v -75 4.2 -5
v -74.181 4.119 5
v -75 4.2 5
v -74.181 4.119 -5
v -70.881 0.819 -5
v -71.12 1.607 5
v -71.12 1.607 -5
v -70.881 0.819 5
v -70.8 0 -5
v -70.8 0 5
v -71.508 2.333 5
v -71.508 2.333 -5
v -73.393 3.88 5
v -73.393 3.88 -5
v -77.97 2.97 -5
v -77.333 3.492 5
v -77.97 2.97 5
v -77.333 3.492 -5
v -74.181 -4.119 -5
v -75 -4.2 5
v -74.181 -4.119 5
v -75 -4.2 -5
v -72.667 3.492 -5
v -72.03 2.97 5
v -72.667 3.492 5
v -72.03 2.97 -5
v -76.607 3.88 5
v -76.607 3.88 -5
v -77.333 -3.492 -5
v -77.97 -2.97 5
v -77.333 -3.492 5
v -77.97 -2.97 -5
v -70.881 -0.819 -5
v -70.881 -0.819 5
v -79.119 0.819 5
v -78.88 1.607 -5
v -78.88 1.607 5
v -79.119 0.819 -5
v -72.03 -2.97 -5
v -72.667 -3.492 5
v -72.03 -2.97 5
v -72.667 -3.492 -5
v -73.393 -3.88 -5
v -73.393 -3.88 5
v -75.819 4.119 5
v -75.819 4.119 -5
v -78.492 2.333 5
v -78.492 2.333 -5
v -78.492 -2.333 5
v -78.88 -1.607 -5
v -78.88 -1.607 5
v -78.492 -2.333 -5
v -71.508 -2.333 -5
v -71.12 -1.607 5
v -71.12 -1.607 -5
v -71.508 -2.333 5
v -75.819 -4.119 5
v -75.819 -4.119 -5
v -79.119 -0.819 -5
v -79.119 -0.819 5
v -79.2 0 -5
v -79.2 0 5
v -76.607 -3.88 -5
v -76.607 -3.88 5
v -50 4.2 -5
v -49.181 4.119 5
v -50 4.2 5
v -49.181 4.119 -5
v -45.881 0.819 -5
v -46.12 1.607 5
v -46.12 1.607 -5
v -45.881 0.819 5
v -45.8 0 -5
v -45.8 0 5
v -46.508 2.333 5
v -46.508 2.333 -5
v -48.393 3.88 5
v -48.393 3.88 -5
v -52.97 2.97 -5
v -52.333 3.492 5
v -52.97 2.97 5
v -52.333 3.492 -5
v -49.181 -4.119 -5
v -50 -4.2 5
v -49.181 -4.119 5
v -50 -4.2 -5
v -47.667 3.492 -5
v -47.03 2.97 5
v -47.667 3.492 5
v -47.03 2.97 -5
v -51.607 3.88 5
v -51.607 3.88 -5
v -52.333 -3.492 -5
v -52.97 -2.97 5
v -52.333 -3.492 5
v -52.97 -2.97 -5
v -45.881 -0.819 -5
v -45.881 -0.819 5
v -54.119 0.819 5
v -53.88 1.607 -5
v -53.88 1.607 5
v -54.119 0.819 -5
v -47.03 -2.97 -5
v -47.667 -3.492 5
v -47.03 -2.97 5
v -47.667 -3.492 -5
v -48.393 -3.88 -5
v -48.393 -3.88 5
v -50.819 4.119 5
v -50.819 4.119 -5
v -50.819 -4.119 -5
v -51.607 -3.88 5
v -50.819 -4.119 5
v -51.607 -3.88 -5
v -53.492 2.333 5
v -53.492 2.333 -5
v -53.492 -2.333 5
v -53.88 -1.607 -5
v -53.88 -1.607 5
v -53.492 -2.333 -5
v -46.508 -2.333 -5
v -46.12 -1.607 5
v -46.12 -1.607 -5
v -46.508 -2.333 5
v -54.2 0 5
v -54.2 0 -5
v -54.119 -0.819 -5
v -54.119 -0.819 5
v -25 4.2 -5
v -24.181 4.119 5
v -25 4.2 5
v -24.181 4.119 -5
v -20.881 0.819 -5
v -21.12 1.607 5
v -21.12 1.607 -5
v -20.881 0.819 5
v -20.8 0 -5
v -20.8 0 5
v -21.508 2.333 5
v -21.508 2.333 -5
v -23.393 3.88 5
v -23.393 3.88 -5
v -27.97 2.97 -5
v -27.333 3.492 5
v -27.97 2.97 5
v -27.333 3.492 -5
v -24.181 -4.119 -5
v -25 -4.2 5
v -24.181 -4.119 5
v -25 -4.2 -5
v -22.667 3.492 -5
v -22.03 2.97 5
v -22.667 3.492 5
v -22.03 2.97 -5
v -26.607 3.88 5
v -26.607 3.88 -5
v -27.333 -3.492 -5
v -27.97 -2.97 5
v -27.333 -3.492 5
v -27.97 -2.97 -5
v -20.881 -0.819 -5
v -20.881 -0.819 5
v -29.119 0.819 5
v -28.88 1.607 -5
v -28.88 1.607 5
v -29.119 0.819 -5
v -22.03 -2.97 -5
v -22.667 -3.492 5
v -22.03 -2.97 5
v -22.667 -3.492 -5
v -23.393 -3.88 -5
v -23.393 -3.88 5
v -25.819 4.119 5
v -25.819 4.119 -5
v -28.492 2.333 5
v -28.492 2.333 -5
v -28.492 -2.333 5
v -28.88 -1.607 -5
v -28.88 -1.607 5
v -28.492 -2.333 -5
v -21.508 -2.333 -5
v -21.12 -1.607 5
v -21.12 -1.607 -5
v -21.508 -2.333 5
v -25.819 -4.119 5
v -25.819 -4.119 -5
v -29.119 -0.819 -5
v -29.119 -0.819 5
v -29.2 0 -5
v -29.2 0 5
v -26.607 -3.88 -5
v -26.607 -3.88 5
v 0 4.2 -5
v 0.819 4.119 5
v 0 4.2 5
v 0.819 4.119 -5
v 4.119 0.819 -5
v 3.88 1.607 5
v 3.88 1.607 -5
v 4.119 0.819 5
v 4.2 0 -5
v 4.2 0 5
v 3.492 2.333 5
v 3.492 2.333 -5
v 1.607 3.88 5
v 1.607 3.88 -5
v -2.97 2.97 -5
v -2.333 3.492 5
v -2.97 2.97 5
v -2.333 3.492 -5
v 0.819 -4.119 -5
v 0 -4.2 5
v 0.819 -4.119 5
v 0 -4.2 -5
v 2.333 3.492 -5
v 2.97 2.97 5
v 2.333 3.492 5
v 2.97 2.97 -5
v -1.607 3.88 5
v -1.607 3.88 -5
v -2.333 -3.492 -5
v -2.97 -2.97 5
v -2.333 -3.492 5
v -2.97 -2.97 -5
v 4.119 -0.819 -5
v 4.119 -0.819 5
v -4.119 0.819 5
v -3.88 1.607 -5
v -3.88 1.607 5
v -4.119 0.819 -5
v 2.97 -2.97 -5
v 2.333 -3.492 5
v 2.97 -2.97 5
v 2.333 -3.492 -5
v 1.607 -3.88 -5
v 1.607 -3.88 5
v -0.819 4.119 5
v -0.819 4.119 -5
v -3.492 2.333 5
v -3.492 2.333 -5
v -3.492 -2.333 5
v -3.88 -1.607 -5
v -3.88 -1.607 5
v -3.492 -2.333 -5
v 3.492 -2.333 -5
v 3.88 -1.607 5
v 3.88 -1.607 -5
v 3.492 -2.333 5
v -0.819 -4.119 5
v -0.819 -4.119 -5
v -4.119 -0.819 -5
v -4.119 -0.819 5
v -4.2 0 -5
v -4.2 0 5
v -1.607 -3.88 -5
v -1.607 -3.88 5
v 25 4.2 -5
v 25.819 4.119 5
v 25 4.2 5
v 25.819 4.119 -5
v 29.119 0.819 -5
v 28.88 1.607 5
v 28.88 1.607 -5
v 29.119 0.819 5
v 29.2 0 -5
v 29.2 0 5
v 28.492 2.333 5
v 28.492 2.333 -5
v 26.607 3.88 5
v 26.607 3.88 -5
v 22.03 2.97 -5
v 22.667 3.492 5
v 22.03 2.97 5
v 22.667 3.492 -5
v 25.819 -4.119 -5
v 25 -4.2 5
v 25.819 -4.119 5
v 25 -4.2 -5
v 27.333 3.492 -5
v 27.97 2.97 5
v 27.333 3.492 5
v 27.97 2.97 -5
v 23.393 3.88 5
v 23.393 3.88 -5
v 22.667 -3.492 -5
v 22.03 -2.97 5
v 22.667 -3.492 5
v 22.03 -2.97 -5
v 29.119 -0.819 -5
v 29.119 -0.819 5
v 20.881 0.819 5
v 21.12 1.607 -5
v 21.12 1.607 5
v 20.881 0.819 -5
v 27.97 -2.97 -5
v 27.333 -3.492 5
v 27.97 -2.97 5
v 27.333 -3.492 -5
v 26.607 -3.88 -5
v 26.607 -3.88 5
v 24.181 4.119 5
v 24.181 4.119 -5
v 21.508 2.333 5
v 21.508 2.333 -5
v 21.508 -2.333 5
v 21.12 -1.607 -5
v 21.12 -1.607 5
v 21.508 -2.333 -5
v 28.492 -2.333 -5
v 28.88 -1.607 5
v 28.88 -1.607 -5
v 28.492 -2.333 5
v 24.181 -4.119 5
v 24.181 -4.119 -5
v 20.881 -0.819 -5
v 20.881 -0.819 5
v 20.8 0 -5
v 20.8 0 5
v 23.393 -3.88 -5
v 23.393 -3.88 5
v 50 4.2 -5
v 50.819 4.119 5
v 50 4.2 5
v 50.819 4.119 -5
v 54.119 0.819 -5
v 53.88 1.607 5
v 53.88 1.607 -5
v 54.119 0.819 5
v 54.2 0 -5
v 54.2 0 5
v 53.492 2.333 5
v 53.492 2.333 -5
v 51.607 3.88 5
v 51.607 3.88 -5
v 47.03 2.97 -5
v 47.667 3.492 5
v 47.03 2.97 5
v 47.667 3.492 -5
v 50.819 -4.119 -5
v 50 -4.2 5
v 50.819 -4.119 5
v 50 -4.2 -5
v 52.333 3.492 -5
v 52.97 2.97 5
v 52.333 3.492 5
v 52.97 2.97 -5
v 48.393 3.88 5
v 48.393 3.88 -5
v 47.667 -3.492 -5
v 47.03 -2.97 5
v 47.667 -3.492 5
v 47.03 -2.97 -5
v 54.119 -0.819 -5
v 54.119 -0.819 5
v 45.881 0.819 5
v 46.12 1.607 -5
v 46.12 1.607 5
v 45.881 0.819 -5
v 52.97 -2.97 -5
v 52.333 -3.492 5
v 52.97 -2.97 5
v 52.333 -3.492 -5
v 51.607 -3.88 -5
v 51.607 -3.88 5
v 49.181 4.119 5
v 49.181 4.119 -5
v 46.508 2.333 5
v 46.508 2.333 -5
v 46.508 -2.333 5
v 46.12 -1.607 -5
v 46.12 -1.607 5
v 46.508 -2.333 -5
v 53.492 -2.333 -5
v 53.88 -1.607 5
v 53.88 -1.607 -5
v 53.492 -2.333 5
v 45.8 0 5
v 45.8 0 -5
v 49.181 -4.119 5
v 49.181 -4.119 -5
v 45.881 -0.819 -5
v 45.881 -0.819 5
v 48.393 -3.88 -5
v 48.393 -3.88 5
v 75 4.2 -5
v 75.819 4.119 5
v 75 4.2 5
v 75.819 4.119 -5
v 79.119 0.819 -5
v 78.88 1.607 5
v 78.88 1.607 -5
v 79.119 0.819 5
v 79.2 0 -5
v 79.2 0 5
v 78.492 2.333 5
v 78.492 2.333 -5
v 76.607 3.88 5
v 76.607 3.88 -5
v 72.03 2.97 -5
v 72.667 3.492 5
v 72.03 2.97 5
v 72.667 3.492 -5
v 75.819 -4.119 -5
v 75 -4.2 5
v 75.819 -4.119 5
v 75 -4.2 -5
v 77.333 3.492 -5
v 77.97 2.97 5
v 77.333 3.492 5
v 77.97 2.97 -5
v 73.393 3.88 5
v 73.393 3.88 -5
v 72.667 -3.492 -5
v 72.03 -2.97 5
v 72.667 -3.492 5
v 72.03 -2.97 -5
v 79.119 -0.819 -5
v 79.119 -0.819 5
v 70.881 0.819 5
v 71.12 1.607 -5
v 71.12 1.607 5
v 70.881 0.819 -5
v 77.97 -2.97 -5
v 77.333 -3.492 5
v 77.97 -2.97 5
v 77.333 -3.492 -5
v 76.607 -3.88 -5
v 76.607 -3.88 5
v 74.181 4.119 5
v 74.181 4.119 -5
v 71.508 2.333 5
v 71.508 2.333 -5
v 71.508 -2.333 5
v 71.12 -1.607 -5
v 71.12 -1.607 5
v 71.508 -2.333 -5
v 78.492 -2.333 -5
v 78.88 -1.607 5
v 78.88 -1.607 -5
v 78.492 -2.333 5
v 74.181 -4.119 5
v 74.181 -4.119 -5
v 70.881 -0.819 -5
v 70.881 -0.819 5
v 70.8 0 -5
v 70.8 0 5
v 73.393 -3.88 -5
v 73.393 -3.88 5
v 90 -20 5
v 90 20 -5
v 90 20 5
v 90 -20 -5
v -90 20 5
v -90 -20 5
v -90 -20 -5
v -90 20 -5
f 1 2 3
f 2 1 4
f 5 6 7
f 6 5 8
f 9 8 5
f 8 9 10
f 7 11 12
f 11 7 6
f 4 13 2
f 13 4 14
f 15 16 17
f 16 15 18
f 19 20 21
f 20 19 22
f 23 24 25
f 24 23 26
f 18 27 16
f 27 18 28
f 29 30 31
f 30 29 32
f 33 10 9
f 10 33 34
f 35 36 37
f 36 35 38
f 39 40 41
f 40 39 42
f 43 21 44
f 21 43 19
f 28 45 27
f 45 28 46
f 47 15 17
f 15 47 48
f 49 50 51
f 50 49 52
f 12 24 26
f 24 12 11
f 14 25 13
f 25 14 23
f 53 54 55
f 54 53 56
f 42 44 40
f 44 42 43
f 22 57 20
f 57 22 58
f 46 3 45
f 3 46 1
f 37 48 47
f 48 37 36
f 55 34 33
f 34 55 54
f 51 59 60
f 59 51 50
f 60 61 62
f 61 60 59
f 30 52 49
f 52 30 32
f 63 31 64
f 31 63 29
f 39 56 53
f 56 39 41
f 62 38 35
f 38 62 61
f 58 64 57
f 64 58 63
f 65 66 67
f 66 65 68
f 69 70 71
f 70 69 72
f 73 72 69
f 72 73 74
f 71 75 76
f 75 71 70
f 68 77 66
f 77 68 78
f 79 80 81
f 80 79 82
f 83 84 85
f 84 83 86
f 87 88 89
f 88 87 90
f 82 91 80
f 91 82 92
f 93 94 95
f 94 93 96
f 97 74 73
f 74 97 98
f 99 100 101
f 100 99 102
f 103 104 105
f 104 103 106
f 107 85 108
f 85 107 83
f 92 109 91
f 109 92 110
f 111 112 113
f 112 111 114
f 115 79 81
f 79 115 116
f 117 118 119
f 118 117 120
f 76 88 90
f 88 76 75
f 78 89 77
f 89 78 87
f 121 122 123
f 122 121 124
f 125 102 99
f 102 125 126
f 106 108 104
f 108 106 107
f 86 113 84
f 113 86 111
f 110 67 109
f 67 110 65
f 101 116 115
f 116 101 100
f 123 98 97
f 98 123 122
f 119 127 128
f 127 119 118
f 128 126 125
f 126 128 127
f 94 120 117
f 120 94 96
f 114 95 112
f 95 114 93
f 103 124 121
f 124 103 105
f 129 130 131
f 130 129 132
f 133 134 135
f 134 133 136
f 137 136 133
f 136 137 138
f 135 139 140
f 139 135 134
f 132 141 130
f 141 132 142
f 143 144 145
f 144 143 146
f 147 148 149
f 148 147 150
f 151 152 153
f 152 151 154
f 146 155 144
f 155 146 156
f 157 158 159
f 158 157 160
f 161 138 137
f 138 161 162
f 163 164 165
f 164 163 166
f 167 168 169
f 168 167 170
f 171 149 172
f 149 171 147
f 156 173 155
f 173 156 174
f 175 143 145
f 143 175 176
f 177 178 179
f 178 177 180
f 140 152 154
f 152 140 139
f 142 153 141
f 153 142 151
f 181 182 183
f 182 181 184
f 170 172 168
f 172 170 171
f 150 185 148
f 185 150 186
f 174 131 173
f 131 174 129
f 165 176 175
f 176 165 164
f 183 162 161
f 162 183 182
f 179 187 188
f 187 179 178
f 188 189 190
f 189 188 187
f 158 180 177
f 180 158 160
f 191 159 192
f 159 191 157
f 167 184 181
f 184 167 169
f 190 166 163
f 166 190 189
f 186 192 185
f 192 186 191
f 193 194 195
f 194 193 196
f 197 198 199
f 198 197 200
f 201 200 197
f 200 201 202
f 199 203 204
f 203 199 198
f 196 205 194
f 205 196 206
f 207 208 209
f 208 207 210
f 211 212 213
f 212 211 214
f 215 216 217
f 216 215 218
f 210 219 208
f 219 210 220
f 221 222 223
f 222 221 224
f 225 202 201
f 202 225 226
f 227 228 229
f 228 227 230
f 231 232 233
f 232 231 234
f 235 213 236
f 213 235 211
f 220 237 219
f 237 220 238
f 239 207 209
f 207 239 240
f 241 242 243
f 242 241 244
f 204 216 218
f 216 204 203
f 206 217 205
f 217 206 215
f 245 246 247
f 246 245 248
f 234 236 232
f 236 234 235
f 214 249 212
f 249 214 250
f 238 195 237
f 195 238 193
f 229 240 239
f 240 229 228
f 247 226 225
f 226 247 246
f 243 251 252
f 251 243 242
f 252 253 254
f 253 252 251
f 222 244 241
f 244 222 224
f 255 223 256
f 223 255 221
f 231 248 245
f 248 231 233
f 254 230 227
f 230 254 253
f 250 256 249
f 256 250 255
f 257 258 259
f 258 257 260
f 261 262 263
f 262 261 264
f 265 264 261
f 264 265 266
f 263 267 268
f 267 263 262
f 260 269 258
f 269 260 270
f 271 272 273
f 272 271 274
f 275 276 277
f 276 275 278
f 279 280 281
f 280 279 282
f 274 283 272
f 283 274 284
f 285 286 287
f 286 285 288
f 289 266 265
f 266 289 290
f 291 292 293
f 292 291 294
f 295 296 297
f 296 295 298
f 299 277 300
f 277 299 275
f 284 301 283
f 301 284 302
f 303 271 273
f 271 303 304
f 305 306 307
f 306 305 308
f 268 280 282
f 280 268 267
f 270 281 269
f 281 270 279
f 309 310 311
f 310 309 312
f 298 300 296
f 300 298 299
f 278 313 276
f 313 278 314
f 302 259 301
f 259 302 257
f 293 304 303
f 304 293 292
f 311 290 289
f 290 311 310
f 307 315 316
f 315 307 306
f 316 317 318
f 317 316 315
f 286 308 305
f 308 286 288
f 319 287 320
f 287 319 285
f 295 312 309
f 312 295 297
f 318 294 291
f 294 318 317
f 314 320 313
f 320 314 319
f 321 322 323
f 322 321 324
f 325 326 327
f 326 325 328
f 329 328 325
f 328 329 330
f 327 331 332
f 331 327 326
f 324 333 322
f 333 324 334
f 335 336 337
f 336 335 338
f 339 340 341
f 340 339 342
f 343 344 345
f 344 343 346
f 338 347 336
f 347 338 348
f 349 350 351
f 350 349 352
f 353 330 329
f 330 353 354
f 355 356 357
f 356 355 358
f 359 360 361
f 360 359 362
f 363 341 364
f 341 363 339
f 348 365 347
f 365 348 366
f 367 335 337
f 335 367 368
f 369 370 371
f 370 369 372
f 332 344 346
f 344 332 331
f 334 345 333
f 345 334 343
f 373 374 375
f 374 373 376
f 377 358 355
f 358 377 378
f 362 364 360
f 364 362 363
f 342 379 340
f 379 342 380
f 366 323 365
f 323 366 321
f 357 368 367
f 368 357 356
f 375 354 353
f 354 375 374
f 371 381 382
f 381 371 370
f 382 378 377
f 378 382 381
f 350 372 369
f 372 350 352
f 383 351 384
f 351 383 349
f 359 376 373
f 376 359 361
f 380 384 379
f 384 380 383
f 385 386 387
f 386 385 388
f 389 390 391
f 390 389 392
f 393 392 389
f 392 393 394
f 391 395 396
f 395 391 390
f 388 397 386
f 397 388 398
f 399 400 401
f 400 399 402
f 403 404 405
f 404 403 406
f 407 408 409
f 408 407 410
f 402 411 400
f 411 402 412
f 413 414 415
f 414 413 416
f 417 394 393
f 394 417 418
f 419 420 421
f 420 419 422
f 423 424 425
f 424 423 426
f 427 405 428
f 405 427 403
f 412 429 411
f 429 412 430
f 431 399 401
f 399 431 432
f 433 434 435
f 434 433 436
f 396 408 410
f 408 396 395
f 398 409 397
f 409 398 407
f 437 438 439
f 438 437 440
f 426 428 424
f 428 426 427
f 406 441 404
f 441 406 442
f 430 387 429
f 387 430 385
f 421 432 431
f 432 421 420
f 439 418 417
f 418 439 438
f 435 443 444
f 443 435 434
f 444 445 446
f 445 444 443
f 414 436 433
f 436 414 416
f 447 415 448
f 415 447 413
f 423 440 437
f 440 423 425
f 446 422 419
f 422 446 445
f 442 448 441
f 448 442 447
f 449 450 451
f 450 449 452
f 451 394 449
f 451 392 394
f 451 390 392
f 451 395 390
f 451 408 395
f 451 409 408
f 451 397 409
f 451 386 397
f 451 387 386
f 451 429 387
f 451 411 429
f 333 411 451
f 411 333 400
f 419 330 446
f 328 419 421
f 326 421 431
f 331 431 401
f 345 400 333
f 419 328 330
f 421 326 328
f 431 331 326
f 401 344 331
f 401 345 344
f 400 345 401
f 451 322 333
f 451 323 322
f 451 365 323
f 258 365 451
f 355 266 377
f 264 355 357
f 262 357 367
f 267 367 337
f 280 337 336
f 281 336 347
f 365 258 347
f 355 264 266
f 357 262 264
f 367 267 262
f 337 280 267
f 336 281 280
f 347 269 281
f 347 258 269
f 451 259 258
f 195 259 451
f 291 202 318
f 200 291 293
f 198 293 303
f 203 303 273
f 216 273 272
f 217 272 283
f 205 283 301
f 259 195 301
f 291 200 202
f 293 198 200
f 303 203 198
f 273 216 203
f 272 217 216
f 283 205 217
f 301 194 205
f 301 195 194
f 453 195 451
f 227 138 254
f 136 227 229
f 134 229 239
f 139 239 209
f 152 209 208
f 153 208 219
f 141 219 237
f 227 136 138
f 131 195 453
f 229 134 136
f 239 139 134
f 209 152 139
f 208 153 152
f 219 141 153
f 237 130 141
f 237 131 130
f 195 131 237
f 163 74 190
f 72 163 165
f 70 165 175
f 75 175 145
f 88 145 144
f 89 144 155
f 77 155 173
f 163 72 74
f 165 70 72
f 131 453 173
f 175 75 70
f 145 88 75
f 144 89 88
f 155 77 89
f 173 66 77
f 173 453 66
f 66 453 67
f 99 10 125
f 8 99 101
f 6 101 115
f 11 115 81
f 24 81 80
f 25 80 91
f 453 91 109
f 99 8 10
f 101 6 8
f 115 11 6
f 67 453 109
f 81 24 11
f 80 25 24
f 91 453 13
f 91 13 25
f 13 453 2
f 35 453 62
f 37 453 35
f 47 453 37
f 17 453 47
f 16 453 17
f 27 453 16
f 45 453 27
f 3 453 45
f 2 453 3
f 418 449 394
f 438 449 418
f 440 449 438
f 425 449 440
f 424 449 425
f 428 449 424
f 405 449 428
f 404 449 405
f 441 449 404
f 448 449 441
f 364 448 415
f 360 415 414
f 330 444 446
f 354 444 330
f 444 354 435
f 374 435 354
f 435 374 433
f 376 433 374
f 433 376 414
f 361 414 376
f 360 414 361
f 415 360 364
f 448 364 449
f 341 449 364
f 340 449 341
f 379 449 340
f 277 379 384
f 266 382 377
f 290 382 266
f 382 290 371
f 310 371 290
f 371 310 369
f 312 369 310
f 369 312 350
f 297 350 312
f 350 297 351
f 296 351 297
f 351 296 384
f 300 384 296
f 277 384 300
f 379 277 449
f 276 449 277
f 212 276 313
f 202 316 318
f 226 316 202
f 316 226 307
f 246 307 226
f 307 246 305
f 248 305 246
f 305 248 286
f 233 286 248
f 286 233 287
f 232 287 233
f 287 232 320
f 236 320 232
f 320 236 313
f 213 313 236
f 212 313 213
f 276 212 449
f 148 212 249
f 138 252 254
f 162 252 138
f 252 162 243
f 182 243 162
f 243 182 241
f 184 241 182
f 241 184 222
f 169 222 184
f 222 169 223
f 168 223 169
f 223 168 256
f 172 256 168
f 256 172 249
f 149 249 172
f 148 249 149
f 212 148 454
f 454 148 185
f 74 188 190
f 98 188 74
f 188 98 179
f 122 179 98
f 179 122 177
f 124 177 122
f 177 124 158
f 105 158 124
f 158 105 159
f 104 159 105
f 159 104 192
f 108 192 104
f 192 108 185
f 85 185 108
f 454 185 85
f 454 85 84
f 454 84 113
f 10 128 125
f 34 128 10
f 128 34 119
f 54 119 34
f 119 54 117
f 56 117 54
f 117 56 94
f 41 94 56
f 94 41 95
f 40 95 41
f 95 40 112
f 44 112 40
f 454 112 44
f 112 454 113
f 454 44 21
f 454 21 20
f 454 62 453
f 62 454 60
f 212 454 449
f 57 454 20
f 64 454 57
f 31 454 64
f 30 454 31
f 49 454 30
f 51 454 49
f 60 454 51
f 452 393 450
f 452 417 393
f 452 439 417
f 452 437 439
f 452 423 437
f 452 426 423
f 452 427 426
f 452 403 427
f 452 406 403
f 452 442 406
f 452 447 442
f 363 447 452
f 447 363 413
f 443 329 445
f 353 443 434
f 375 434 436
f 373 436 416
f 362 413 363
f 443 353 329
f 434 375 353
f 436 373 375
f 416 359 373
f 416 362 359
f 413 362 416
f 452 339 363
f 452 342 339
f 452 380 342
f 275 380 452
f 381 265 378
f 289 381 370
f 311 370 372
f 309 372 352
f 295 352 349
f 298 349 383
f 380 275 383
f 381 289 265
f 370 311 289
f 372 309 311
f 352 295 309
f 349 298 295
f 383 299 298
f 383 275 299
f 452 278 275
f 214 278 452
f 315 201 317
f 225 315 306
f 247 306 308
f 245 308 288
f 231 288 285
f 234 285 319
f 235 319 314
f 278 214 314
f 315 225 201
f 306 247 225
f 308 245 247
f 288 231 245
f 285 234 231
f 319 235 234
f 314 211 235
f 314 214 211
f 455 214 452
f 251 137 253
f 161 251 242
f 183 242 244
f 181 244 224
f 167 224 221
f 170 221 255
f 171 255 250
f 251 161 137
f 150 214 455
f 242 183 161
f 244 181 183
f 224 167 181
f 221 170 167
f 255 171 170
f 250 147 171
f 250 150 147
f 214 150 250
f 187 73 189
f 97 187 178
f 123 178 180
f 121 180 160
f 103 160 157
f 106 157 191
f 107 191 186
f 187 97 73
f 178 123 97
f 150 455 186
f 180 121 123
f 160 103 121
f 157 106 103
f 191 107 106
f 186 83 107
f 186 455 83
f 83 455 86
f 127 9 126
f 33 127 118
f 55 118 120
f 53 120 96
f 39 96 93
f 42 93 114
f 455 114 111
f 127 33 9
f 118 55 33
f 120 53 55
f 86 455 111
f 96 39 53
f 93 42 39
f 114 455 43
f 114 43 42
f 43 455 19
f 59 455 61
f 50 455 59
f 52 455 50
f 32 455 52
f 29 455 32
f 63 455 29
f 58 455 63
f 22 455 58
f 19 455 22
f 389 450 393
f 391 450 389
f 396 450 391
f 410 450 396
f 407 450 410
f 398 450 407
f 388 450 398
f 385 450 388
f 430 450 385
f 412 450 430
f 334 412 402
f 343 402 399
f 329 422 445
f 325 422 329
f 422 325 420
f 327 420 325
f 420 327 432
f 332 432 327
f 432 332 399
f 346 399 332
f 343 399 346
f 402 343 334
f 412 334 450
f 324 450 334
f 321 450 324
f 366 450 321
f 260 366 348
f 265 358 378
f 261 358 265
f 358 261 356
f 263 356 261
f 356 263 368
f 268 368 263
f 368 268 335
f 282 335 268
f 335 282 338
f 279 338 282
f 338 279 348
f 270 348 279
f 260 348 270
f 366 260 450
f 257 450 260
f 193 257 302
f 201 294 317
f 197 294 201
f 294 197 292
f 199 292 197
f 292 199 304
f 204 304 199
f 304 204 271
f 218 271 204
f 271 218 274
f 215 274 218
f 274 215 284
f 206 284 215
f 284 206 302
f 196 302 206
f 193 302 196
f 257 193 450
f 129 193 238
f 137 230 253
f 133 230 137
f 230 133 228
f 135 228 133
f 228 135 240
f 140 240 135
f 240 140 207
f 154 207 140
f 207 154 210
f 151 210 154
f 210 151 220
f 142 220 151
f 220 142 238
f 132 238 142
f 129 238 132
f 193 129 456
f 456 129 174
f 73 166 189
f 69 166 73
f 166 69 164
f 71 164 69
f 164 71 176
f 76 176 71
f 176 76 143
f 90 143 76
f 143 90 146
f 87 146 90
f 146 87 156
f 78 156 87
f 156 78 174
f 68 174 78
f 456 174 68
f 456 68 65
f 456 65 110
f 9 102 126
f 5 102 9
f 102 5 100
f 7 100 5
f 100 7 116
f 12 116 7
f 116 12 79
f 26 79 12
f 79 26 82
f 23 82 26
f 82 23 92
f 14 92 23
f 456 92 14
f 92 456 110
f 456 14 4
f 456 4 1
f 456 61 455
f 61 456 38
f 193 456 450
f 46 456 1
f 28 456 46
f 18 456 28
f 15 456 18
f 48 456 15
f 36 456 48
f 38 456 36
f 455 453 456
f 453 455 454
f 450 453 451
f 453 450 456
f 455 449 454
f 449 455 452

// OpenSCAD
$fn = 32;

// ----------------------------------------------------------------------
// Hole bar, 7 x Ø8.4
// row layout, 15 mm edge offset
// ----------------------------------------------------------------------

// --- parameters (mm) ---
bar_w = 40;    // bar width (Y)
bar_t = 10;    // bar thickness (Z)
holes = 7;     // holes per row
hole_d = 8.4;  // hole diameter
edge = 15;     // offset from the bar end to the first hole
pitch = 25;    // pitch between neighbouring holes

// --- derived feature positions (mm) ---
span = (holes - 1) * pitch;   // = 150   distance between the end holes
bar_l = span + 2 * edge;      // = 180   overall bar length
start_x = -bar_l / 2 + edge;  // = -75   X of the first hole
feature_centers = [
  [start_x + 0 * pitch, 0],
  [start_x + 1 * pitch, 0],
  [start_x + 2 * pitch, 0],
  [start_x + 3 * pitch, 0],
  [start_x + 4 * pitch, 0],
  [start_x + 5 * pitch, 0],
  [start_x + 6 * pitch, 0]
];   // hole centres of the first row

// bar with one row of holes, drilled from feature_centers
difference() {
  translate([-bar_l / 2, -bar_w / 2, -bar_t / 2]) cube([bar_l, bar_w, bar_t]);
  for (centre = feature_centers)
    translate([centre[0], centre[1], 0])
      cylinder(d = hole_d, h = bar_t + 2, center = true);
}
